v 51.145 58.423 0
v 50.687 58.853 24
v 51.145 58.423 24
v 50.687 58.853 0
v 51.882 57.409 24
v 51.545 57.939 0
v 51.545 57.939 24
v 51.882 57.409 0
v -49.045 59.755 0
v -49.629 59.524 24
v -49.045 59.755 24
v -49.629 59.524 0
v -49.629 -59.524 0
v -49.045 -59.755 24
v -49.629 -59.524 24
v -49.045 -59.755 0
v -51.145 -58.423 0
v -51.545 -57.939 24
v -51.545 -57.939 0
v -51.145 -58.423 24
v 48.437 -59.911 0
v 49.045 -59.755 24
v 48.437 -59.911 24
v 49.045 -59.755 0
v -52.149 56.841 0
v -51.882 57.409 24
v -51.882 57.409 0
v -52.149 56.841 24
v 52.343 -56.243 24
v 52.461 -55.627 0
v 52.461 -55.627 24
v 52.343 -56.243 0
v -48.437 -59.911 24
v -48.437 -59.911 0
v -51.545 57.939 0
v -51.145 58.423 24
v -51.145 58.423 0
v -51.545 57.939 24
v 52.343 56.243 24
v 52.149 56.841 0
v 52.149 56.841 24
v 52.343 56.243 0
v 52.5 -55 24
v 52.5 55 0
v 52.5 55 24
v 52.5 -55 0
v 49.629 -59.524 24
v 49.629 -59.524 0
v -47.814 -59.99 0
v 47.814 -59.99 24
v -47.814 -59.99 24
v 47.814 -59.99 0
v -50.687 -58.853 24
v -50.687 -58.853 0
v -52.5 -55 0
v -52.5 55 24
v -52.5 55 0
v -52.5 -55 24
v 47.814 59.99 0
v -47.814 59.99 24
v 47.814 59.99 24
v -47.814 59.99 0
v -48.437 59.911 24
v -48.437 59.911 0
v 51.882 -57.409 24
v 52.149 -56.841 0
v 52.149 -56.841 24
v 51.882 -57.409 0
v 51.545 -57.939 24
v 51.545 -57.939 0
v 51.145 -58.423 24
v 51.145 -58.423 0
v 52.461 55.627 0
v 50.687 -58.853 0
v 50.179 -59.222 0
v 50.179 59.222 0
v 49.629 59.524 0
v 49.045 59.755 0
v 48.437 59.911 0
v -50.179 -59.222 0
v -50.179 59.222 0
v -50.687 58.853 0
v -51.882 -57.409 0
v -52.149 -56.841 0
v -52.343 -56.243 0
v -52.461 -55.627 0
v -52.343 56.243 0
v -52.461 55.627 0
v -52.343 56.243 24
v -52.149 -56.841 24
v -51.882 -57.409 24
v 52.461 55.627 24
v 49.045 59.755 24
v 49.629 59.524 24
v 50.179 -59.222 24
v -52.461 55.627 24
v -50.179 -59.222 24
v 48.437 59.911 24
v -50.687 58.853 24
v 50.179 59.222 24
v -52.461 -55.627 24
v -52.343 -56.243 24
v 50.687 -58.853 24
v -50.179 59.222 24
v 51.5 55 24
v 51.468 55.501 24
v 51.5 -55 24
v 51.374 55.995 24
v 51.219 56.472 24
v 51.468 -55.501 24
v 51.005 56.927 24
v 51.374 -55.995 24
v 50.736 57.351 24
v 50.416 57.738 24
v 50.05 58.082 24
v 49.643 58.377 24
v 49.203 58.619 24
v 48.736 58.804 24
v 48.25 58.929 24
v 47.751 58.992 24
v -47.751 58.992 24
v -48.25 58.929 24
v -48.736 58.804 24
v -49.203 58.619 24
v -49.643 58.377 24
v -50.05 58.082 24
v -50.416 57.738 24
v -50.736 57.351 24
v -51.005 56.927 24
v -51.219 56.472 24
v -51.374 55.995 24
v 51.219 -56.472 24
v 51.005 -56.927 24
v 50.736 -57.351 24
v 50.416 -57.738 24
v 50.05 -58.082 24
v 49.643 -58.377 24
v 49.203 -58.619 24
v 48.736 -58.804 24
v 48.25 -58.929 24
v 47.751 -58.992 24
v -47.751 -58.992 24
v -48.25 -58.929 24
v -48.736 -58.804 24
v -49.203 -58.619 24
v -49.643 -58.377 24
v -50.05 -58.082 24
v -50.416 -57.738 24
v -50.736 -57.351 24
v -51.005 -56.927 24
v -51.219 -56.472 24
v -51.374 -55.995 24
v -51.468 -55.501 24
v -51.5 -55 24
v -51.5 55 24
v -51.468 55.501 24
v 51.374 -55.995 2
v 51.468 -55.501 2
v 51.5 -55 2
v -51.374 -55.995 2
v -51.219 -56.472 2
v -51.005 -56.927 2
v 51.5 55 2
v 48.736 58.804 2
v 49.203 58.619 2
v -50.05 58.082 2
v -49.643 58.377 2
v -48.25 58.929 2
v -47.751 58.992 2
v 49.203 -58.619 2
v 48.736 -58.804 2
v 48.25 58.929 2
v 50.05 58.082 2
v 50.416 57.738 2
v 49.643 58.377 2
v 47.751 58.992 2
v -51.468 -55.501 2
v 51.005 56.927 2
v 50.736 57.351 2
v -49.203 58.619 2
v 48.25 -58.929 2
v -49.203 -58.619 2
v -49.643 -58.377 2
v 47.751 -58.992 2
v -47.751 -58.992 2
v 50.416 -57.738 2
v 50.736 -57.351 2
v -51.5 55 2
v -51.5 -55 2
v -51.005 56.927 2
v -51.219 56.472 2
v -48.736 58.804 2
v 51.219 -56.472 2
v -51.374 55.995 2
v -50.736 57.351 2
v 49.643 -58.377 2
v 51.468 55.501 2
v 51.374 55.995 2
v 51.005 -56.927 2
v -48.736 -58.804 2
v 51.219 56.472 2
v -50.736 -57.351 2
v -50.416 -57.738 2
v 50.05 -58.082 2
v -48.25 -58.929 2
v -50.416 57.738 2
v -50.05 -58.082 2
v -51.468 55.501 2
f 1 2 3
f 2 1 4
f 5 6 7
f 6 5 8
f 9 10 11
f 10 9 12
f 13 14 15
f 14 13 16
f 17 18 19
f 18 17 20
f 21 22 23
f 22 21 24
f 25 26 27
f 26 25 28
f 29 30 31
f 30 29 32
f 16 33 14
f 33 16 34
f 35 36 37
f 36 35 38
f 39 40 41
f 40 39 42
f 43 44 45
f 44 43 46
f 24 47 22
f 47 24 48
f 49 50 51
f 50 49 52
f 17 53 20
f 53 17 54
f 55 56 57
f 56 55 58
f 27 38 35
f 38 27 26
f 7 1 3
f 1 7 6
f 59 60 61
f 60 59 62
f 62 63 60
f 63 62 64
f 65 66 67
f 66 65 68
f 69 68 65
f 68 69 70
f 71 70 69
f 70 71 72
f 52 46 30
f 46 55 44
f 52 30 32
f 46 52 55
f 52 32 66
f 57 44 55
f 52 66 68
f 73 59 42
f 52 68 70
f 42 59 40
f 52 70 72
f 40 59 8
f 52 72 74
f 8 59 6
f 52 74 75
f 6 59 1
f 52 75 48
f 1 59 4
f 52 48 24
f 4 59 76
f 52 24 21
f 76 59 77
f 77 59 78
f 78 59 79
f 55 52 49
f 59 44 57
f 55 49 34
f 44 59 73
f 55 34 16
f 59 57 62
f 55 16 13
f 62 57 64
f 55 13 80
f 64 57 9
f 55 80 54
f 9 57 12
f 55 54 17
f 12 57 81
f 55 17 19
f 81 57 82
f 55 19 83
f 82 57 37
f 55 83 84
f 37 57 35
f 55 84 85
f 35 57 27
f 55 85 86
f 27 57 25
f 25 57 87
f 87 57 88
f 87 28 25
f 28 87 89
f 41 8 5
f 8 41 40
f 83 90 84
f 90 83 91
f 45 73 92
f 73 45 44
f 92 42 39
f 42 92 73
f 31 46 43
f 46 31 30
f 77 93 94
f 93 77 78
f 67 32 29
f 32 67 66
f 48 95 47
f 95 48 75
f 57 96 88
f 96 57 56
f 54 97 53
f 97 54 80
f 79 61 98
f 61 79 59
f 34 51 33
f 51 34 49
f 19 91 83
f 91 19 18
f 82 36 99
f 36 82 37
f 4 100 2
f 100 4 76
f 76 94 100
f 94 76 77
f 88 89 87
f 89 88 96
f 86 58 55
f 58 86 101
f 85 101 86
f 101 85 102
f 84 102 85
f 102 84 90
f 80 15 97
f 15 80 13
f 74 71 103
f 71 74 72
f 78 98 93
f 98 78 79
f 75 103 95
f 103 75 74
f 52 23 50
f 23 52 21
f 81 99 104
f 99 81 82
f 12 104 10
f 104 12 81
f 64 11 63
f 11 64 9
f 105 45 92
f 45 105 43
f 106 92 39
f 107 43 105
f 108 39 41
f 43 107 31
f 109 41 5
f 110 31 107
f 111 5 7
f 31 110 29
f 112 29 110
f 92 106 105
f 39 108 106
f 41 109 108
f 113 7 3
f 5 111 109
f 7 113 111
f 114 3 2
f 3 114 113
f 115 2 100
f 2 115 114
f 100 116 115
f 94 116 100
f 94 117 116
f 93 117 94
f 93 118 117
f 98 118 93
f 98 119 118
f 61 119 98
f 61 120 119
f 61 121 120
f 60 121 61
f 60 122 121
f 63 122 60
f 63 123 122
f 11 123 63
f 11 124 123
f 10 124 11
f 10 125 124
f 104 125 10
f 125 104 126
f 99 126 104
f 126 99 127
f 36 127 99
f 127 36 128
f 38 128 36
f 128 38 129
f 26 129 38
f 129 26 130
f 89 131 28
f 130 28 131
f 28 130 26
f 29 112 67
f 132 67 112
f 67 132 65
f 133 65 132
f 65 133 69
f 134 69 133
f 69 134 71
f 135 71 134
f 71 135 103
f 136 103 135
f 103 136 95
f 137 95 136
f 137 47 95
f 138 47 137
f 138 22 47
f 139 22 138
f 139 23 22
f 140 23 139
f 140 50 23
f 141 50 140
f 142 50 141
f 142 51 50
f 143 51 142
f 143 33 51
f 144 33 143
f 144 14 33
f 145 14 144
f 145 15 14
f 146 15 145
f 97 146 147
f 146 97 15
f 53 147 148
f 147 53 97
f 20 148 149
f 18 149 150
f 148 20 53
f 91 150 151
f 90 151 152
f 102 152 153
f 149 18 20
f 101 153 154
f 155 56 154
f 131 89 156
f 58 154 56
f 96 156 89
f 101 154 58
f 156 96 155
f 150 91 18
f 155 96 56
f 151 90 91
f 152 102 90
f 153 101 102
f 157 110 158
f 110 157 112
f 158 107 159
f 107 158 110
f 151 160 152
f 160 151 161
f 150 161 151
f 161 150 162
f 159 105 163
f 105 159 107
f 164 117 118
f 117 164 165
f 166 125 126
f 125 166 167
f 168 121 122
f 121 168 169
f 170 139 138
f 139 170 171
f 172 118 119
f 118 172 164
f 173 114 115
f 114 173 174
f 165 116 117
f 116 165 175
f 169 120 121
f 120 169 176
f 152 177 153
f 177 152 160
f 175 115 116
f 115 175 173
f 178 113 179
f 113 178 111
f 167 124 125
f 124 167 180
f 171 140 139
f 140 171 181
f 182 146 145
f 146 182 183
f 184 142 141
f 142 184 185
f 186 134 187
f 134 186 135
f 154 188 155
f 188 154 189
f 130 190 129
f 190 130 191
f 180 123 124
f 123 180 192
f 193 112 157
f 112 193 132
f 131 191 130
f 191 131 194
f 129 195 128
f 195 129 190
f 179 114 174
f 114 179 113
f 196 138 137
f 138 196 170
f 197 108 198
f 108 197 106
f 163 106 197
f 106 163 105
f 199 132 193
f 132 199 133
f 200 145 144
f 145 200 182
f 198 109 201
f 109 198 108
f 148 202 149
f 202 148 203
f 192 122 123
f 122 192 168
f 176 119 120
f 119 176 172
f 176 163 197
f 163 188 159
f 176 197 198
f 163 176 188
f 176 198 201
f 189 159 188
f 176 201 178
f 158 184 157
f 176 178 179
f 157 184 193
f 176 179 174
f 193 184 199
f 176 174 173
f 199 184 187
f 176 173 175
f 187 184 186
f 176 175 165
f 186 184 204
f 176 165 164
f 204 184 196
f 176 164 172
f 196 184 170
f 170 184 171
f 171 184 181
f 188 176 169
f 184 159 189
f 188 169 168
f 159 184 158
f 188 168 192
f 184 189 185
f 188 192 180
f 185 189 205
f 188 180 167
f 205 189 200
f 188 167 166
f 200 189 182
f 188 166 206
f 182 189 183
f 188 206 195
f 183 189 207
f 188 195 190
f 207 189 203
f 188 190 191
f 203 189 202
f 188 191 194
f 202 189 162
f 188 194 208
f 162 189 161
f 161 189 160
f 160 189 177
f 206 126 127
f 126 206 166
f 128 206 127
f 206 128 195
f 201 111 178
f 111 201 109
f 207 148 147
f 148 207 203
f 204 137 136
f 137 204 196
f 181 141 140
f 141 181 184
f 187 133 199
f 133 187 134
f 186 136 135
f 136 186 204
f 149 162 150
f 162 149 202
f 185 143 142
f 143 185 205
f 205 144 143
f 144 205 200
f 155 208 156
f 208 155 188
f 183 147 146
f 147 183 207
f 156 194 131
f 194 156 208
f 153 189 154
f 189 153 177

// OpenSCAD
$fn = 50;


difference() {
	union() {
		hull() {
			translate(v = [-47.5000000000, 55.0000000000, 0]) {
				cylinder(h = 24, r = 5);
			}
			translate(v = [47.5000000000, 55.0000000000, 0]) {
				cylinder(h = 24, r = 5);
			}
			translate(v = [-47.5000000000, -55.0000000000, 0]) {
				cylinder(h = 24, r = 5);
			}
			translate(v = [47.5000000000, -55.0000000000, 0]) {
				cylinder(h = 24, r = 5);
			}
		}
	}
	union() {
		translate(v = [0, 0, 2]) {
			hull() {
				translate(v = [-47.5000000000, 55.0000000000, 0]) {
					cylinder(h = 22, r = 4);
				}
				translate(v = [47.5000000000, 55.0000000000, 0]) {
					cylinder(h = 22, r = 4);
				}
				translate(v = [-47.5000000000, -55.0000000000, 0]) {
					cylinder(h = 22, r = 4);
				}
				translate(v = [47.5000000000, -55.0000000000, 0]) {
					cylinder(h = 22, r = 4);
				}
			}
		}
	}
}
